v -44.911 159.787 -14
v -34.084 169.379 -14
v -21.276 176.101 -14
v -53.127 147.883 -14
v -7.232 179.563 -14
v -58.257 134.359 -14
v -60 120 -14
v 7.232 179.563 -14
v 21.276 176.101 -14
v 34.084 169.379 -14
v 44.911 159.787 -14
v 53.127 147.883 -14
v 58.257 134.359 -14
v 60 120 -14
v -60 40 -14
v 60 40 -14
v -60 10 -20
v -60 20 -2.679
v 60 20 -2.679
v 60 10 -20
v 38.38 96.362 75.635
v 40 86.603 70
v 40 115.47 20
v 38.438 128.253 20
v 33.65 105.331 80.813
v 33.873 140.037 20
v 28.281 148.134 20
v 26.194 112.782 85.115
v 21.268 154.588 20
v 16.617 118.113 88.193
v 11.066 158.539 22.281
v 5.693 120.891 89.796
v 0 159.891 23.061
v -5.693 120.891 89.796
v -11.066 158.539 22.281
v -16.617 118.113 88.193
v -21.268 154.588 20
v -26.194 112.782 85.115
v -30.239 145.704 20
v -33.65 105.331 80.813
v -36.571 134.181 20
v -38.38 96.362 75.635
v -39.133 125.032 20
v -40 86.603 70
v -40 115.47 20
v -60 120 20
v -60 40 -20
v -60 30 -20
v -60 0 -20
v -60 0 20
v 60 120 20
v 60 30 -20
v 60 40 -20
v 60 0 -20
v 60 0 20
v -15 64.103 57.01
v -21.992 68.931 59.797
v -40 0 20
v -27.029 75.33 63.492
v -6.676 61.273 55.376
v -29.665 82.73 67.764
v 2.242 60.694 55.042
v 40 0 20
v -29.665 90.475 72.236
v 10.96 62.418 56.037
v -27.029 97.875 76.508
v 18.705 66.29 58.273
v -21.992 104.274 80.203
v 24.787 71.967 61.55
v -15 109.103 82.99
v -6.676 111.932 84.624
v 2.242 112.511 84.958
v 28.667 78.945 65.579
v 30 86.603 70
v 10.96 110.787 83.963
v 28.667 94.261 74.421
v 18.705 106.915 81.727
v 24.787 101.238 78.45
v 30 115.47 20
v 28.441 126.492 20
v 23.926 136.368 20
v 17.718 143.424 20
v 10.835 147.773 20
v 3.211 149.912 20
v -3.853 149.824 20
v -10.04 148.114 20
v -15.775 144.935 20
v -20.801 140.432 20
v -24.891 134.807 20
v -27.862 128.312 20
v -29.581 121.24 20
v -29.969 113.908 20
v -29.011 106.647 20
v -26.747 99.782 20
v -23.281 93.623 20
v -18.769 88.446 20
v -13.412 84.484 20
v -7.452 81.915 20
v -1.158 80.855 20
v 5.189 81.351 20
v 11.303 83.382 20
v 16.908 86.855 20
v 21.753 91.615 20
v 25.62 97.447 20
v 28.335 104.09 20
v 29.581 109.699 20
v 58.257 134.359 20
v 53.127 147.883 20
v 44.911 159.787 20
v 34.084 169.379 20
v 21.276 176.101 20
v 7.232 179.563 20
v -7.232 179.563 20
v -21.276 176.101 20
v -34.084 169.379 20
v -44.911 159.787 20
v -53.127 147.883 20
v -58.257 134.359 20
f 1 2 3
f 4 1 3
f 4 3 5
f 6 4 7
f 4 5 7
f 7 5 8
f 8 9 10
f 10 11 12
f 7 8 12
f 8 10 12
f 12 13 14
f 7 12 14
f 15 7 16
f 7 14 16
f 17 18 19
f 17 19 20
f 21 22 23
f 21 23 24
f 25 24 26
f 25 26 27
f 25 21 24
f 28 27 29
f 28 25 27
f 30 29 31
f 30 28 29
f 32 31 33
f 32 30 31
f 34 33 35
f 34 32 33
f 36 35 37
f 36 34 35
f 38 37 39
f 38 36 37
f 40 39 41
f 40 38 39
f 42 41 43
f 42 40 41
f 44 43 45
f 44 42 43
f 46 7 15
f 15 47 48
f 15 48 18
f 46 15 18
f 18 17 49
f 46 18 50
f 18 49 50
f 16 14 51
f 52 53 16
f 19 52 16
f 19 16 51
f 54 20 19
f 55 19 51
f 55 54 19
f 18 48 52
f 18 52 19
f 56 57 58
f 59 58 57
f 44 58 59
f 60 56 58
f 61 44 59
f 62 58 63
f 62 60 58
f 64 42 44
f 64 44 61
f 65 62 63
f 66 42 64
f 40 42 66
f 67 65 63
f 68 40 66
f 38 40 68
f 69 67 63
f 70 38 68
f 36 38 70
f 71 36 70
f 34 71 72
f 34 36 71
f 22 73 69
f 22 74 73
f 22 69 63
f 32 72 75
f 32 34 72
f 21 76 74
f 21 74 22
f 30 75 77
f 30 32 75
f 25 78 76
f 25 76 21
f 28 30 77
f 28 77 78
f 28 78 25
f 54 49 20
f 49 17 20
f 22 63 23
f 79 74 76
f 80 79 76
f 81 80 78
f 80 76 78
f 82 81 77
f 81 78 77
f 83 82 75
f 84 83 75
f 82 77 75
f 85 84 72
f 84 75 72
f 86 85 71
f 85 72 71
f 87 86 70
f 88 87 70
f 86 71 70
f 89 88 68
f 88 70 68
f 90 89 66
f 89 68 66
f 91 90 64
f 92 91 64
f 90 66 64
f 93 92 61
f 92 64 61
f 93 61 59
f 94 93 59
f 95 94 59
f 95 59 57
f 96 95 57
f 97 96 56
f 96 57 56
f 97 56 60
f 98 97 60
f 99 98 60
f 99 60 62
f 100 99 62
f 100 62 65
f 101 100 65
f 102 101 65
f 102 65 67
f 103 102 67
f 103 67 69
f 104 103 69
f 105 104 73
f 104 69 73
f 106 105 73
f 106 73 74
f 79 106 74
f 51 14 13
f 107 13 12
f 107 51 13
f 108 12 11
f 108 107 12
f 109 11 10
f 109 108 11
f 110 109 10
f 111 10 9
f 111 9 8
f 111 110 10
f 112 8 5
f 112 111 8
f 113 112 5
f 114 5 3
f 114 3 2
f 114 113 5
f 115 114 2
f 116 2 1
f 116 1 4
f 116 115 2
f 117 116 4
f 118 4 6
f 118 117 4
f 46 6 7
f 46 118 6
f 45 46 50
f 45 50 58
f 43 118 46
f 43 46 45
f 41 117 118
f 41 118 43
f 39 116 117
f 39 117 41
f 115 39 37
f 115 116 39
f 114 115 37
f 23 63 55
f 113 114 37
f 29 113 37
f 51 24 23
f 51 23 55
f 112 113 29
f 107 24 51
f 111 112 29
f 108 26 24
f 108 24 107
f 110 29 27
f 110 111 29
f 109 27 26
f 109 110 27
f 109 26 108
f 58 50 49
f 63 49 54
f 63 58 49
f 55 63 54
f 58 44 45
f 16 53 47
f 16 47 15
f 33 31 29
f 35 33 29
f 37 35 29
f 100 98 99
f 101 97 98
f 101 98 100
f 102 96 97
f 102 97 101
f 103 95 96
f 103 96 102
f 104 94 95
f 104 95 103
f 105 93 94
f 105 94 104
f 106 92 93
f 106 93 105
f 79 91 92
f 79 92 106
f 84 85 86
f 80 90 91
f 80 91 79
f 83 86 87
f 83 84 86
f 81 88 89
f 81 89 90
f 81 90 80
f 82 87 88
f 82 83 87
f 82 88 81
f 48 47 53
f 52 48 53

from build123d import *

# Parameters (mm, degrees)
F0_W      = 120
F0_H      = 40
F1_DEPTH  = 120
F3_DEPTH  = 40
F5_R      = 30
F8_DEPTH  = 77.2940758616
F9_W      = 80
F9_H      = 6
F9_W_2    = 71.5949898127
F10_DEPTH = 120
F6_DEPTH  = 120
F7_DEPTH  = 80


with BuildPart() as f1:
    # F0 (on Front) → F1 (new body)
    with BuildSketch(Plane.XZ):
        Rectangle(F0_W, F0_H)
    extrude(amount=-F1_DEPTH)

    # F2 (on face) → F3 (join)
    with BuildSketch(Plane.XY.offset(20)):
        with BuildLine():
            Line((-60, 120), (60, 120))
            ThreePointArc((60, 120), (0, 180), (-60, 120))
        make_face()
    extrude(amount=-F3_DEPTH)

    # F5 (on face) → F8 (join)
    with BuildSketch(Plane(origin=(0, -8.6602540378, 15), x_dir=(1, 0, 0), z_dir=(0, -0.5, 0.8660254038))):
        with BuildLine():
            Line((-40, 10), (0, 10))
            Line((0, 10), (40, 10))
            Line((40, 10), (40, 110))
            ThreePointArc((40, 110), (0, 70), (-40, 110))
            Line((-40, 110), (-40, 10))
        make_face()
        with BuildLine():
            ThreePointArc((-40, 110), (0, 70), (40, 110))
            ThreePointArc((40, 110), (0, 150), (-40, 110))
        make_face()
        with Locations((0, 110)):
            Circle(F5_R, mode=Mode.SUBTRACT)
    extrude(amount=-F8_DEPTH)

    # F9 (on face) → F10 (cut)
    with BuildSketch(Plane.YZ.offset(60)):
        with Locations((80, -17)):
            Rectangle(F9_W, F9_H)
        with Locations((155.7974949063, -17)):
            Rectangle(F9_W_2, F9_H)
    extrude(amount=-F10_DEPTH, mode=Mode.SUBTRACT)

    # F11 (on face) → F6 (cut)
    with BuildSketch(Plane.YZ.offset(60)):
        Polygon((20, -2.6794919243), (20, -20), (30, -20), align=None)
        Polygon((10, -20), (20, -20), (20, -2.6794919243), align=None)
    extrude(amount=-F6_DEPTH, mode=Mode.SUBTRACT)

    # F7 (cut): a face of the model
    f7_faces = [f1.faces().sort_by_distance(p)[0] for p in [
        (40, 49.0157227063, -28.9795444194),
    ]]
    extrude(f7_faces, amount=-F7_DEPTH, mode=Mode.SUBTRACT)


solid = f1.part
